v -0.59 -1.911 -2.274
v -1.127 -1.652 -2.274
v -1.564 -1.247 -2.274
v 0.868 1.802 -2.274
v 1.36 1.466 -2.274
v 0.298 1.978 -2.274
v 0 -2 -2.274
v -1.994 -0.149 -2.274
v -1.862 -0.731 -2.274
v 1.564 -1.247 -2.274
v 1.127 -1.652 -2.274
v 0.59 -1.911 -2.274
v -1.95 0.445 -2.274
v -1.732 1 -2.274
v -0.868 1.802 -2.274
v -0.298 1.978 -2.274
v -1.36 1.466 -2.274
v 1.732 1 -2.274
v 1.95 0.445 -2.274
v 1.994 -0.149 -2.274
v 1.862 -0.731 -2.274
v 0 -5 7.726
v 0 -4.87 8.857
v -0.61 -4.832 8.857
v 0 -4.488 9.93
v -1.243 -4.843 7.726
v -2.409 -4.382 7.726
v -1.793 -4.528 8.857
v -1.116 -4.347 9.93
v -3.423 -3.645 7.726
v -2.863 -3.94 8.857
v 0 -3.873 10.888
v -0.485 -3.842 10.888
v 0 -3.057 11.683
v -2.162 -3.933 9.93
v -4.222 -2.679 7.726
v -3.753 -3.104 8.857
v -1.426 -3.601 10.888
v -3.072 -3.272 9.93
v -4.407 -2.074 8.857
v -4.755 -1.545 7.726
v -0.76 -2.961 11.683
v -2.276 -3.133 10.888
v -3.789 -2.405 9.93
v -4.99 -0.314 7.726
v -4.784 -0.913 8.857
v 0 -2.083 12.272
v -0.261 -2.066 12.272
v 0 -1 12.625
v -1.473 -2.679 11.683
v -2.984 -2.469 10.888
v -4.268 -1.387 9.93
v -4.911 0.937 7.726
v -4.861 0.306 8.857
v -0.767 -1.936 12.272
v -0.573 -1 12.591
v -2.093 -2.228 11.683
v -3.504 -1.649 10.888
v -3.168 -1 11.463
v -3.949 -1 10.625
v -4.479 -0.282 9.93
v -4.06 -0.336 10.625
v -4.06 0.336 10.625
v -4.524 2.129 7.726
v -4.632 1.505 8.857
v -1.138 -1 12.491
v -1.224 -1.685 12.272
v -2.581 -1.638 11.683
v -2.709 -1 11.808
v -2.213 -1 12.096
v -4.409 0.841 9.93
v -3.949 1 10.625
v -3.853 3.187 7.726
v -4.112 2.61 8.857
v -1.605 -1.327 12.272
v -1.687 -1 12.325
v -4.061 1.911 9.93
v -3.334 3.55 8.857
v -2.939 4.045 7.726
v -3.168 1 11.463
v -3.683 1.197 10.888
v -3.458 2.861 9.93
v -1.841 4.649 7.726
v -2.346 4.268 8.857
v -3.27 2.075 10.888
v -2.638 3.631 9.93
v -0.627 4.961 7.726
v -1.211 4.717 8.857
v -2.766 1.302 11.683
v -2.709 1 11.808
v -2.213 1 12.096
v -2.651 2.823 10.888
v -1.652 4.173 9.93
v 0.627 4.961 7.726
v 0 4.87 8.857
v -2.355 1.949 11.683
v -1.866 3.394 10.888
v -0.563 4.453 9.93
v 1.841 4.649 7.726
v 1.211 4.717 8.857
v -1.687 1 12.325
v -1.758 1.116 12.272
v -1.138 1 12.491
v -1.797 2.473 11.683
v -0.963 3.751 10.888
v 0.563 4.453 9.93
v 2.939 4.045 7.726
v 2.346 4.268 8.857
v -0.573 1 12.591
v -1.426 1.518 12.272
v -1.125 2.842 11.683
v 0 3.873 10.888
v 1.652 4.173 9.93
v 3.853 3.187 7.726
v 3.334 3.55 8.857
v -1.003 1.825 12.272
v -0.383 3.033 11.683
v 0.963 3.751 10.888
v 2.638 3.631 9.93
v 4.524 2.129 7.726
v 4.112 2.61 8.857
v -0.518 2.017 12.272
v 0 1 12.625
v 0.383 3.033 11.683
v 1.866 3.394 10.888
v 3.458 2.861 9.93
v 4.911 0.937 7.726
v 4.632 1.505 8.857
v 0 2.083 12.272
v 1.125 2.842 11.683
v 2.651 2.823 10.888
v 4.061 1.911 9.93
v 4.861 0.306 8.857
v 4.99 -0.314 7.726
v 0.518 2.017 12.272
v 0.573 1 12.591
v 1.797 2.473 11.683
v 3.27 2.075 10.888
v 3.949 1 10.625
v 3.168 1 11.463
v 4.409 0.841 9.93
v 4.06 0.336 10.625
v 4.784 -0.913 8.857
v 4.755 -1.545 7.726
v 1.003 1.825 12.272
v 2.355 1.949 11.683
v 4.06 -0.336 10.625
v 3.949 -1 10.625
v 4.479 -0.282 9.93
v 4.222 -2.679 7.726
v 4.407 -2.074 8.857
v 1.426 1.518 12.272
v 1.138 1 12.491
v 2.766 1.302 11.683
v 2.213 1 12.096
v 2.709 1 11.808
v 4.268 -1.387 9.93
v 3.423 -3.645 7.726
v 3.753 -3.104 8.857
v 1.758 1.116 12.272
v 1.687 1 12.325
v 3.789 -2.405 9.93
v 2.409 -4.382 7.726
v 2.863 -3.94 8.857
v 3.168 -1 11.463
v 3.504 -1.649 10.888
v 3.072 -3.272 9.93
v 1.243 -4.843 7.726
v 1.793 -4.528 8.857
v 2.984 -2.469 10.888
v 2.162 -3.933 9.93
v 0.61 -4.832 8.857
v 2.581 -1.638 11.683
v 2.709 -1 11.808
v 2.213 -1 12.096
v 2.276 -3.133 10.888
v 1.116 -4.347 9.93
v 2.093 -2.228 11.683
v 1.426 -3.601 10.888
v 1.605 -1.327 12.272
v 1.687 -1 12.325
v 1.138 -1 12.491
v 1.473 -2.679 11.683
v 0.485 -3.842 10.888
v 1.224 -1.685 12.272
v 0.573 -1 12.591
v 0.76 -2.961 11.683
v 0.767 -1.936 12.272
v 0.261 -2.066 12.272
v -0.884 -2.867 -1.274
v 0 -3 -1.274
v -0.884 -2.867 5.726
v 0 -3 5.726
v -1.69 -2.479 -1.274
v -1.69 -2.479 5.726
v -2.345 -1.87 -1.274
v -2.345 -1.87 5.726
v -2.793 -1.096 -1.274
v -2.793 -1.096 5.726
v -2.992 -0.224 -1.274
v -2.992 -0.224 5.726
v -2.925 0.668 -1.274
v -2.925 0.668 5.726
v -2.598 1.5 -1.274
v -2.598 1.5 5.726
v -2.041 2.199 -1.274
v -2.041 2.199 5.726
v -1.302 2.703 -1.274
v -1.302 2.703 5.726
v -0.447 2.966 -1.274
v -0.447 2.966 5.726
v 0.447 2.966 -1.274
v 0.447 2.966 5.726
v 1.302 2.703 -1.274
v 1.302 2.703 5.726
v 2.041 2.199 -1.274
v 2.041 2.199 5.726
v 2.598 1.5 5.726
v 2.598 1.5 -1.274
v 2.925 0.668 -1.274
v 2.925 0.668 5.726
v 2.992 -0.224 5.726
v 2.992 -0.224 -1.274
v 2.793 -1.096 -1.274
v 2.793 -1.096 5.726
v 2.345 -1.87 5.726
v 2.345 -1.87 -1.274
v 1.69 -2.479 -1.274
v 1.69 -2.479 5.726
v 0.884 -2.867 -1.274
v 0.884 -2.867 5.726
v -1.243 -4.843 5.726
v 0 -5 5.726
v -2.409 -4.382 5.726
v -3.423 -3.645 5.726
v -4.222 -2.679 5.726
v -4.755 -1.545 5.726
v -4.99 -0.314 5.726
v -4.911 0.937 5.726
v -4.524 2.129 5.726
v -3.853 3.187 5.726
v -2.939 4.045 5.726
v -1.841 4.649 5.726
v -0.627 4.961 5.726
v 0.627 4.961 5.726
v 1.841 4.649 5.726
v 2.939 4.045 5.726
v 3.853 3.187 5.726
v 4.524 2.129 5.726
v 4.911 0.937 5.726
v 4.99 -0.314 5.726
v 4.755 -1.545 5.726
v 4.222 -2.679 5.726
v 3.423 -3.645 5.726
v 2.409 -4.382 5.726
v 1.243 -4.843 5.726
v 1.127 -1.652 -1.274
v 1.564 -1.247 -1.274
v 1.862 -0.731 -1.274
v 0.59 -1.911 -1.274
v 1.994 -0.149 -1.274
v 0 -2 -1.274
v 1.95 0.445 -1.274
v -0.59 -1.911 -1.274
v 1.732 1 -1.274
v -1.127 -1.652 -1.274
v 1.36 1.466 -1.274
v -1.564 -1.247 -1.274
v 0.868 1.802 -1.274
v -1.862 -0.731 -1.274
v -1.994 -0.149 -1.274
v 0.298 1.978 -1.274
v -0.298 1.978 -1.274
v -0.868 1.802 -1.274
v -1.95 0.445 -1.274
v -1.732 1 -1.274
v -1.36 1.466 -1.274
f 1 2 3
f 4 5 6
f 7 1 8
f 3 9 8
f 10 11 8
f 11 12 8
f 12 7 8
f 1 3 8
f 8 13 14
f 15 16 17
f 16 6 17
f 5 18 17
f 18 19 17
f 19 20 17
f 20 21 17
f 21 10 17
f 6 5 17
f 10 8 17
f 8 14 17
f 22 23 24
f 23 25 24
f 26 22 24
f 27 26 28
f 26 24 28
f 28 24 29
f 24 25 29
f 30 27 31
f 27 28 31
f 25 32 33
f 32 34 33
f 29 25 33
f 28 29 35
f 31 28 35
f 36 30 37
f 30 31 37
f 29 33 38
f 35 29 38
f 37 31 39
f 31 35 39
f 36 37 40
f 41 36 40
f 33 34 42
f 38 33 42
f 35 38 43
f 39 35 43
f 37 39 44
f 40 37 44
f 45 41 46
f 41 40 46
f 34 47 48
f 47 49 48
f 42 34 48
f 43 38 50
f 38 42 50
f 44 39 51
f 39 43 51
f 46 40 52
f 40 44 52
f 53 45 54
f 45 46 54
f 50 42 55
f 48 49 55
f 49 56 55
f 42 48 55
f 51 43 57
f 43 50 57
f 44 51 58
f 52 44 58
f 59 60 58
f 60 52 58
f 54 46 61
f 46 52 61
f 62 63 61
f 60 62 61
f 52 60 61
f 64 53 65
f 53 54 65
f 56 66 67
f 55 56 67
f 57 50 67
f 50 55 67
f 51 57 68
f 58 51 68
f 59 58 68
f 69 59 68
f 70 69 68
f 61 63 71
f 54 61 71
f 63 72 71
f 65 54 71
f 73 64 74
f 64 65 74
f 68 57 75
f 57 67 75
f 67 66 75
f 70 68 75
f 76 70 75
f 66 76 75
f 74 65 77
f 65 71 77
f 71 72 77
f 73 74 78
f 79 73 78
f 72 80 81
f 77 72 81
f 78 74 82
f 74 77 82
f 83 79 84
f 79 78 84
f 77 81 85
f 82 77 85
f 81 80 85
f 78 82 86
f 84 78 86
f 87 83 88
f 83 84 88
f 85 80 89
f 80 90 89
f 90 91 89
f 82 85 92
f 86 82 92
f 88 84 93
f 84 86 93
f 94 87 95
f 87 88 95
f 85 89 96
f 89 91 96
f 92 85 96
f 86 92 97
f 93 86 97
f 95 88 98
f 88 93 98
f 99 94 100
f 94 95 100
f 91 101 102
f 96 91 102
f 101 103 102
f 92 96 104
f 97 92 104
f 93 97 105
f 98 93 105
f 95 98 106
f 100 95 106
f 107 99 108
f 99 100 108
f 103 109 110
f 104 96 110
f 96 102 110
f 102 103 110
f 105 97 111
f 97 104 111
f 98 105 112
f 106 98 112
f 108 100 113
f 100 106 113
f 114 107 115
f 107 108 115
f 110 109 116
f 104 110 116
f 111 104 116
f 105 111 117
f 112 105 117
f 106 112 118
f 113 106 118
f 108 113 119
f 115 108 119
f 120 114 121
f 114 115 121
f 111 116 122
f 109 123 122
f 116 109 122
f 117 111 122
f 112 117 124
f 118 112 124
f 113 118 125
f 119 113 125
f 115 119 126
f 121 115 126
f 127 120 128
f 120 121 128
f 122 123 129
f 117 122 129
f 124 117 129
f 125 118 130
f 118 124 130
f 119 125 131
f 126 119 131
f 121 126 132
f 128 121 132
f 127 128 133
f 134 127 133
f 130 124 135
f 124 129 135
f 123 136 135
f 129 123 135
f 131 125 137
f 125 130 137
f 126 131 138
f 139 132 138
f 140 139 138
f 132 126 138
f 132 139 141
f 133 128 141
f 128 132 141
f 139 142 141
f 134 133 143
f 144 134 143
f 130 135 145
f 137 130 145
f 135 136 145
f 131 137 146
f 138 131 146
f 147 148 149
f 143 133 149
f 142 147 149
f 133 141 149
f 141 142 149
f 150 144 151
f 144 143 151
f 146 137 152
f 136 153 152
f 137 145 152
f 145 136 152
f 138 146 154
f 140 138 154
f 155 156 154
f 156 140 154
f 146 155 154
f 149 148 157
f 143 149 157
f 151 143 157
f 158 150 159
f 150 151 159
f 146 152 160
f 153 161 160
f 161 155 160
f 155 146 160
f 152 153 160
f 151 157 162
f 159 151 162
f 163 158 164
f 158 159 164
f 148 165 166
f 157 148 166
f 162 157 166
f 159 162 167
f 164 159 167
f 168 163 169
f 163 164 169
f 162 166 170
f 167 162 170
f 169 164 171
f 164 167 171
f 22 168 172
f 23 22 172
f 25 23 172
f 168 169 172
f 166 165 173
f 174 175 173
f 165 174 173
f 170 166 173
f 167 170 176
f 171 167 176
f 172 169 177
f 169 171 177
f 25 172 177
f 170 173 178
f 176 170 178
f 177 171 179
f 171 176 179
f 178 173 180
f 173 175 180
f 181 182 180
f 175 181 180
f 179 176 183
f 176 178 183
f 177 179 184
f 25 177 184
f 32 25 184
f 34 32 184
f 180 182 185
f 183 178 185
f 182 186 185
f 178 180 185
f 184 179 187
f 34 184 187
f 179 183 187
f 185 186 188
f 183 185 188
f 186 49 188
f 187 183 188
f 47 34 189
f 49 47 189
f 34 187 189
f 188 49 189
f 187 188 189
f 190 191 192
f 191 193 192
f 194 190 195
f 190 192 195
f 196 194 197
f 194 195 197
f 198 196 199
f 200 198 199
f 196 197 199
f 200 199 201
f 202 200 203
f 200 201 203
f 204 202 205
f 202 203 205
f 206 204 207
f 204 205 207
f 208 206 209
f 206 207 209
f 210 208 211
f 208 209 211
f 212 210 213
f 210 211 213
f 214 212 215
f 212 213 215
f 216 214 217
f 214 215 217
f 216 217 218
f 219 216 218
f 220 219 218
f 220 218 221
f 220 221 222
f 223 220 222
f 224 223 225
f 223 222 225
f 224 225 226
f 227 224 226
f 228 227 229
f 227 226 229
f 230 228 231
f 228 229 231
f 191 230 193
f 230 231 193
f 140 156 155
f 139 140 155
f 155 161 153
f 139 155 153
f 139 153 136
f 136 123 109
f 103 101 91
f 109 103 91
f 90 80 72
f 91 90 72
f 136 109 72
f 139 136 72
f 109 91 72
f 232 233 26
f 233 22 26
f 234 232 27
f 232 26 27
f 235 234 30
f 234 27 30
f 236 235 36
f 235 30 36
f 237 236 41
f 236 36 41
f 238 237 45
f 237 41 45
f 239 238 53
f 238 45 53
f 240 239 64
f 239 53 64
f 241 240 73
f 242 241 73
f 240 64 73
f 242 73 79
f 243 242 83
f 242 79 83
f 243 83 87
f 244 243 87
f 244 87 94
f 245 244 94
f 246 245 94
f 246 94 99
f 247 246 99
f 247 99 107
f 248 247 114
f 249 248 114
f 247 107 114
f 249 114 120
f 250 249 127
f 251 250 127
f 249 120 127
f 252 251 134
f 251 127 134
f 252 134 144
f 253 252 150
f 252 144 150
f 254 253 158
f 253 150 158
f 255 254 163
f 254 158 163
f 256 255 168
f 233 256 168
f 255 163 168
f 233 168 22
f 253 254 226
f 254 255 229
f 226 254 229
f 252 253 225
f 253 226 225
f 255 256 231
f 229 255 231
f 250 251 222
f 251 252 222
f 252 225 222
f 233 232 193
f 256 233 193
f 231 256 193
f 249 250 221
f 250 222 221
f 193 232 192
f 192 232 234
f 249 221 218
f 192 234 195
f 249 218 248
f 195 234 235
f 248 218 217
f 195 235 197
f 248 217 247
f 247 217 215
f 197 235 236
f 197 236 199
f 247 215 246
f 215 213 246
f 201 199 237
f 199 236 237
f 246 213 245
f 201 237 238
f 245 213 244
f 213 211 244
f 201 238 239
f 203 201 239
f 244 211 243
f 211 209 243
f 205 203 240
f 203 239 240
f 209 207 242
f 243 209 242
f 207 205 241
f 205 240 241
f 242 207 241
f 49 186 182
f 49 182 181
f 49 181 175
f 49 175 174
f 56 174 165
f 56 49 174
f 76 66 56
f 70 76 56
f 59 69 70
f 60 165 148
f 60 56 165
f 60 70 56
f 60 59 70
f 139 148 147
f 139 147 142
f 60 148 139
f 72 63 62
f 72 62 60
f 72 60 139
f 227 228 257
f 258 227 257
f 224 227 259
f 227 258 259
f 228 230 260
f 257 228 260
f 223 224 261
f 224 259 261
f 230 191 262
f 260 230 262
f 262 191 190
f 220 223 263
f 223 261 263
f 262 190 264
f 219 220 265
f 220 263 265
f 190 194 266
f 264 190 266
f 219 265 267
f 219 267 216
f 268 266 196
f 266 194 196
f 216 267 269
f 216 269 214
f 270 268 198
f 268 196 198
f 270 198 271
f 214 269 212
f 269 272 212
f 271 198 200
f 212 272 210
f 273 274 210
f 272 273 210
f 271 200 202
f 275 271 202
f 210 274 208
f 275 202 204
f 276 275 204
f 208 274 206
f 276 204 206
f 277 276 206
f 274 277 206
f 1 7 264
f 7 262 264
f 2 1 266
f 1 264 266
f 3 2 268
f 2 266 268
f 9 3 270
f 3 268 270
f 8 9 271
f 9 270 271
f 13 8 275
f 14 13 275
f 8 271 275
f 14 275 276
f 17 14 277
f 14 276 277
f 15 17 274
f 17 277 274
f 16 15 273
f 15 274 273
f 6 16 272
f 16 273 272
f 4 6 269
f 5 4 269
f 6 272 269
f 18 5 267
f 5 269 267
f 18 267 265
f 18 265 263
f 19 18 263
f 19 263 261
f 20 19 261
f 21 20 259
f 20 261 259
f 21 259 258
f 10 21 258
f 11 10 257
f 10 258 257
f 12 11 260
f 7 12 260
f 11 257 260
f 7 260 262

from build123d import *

# Parameters (mm, degrees)
CUT_EXTRUDE1_DEPTH      = 15.558488421
CUT_EXTRUDE1_DEPTH_BACK = 15.558488421
SKETCH2_W               = 4.202041029
SKETCH2_H               = 2


with BuildPart() as part:
    # Sketch1 → Revolve1 (revolve)
    with BuildSketch(Plane(origin=(0, 0, 0), x_dir=(0, 0, -1), z_dir=(1, 0, 0)), mode=Mode.PRIVATE) as revolve1_sk:
        with BuildLine():
            Line((2.274058577, 0), (2.274058577, 2))
            Line((2.274058577, 2), (1.274058577, 2))
            Line((1.274058577, 2), (1.274058577, 3))
            Line((1.274058577, 3), (-5.725941423, 3))
            Line((-5.725941423, 3), (-5.725941423, 5))
            Line((-5.725941423, 5), (-7.725941423, 5))
            ThreePointArc((-7.725941423, 5), (-11.261475329, 3.535533906), (-12.725941423, 0))
            Line((-12.725941423, 0), (2.274058577, 0))
        make_face()
    revolve(revolve1_sk.sketch.rotate(Axis((0, 0, 24), (0, 0, -1)), 180), axis=Axis((0, 0, 24), (0, 0, -1)))

    # Sketch2 → Cut-Extrude1 (cut, two sides: drawn at the far end of the back side and taken through both)
    with BuildSketch(Plane(origin=(0, 0, 0), x_dir=(0, 0, -1), z_dir=(1, 0, 0)).offset(-CUT_EXTRUDE1_DEPTH_BACK)):
        with Locations((-12.725941423, 0)):
            Rectangle(SKETCH2_W, SKETCH2_H)
    extrude(amount=CUT_EXTRUDE1_DEPTH + CUT_EXTRUDE1_DEPTH_BACK, mode=Mode.SUBTRACT)


solid = part.part
